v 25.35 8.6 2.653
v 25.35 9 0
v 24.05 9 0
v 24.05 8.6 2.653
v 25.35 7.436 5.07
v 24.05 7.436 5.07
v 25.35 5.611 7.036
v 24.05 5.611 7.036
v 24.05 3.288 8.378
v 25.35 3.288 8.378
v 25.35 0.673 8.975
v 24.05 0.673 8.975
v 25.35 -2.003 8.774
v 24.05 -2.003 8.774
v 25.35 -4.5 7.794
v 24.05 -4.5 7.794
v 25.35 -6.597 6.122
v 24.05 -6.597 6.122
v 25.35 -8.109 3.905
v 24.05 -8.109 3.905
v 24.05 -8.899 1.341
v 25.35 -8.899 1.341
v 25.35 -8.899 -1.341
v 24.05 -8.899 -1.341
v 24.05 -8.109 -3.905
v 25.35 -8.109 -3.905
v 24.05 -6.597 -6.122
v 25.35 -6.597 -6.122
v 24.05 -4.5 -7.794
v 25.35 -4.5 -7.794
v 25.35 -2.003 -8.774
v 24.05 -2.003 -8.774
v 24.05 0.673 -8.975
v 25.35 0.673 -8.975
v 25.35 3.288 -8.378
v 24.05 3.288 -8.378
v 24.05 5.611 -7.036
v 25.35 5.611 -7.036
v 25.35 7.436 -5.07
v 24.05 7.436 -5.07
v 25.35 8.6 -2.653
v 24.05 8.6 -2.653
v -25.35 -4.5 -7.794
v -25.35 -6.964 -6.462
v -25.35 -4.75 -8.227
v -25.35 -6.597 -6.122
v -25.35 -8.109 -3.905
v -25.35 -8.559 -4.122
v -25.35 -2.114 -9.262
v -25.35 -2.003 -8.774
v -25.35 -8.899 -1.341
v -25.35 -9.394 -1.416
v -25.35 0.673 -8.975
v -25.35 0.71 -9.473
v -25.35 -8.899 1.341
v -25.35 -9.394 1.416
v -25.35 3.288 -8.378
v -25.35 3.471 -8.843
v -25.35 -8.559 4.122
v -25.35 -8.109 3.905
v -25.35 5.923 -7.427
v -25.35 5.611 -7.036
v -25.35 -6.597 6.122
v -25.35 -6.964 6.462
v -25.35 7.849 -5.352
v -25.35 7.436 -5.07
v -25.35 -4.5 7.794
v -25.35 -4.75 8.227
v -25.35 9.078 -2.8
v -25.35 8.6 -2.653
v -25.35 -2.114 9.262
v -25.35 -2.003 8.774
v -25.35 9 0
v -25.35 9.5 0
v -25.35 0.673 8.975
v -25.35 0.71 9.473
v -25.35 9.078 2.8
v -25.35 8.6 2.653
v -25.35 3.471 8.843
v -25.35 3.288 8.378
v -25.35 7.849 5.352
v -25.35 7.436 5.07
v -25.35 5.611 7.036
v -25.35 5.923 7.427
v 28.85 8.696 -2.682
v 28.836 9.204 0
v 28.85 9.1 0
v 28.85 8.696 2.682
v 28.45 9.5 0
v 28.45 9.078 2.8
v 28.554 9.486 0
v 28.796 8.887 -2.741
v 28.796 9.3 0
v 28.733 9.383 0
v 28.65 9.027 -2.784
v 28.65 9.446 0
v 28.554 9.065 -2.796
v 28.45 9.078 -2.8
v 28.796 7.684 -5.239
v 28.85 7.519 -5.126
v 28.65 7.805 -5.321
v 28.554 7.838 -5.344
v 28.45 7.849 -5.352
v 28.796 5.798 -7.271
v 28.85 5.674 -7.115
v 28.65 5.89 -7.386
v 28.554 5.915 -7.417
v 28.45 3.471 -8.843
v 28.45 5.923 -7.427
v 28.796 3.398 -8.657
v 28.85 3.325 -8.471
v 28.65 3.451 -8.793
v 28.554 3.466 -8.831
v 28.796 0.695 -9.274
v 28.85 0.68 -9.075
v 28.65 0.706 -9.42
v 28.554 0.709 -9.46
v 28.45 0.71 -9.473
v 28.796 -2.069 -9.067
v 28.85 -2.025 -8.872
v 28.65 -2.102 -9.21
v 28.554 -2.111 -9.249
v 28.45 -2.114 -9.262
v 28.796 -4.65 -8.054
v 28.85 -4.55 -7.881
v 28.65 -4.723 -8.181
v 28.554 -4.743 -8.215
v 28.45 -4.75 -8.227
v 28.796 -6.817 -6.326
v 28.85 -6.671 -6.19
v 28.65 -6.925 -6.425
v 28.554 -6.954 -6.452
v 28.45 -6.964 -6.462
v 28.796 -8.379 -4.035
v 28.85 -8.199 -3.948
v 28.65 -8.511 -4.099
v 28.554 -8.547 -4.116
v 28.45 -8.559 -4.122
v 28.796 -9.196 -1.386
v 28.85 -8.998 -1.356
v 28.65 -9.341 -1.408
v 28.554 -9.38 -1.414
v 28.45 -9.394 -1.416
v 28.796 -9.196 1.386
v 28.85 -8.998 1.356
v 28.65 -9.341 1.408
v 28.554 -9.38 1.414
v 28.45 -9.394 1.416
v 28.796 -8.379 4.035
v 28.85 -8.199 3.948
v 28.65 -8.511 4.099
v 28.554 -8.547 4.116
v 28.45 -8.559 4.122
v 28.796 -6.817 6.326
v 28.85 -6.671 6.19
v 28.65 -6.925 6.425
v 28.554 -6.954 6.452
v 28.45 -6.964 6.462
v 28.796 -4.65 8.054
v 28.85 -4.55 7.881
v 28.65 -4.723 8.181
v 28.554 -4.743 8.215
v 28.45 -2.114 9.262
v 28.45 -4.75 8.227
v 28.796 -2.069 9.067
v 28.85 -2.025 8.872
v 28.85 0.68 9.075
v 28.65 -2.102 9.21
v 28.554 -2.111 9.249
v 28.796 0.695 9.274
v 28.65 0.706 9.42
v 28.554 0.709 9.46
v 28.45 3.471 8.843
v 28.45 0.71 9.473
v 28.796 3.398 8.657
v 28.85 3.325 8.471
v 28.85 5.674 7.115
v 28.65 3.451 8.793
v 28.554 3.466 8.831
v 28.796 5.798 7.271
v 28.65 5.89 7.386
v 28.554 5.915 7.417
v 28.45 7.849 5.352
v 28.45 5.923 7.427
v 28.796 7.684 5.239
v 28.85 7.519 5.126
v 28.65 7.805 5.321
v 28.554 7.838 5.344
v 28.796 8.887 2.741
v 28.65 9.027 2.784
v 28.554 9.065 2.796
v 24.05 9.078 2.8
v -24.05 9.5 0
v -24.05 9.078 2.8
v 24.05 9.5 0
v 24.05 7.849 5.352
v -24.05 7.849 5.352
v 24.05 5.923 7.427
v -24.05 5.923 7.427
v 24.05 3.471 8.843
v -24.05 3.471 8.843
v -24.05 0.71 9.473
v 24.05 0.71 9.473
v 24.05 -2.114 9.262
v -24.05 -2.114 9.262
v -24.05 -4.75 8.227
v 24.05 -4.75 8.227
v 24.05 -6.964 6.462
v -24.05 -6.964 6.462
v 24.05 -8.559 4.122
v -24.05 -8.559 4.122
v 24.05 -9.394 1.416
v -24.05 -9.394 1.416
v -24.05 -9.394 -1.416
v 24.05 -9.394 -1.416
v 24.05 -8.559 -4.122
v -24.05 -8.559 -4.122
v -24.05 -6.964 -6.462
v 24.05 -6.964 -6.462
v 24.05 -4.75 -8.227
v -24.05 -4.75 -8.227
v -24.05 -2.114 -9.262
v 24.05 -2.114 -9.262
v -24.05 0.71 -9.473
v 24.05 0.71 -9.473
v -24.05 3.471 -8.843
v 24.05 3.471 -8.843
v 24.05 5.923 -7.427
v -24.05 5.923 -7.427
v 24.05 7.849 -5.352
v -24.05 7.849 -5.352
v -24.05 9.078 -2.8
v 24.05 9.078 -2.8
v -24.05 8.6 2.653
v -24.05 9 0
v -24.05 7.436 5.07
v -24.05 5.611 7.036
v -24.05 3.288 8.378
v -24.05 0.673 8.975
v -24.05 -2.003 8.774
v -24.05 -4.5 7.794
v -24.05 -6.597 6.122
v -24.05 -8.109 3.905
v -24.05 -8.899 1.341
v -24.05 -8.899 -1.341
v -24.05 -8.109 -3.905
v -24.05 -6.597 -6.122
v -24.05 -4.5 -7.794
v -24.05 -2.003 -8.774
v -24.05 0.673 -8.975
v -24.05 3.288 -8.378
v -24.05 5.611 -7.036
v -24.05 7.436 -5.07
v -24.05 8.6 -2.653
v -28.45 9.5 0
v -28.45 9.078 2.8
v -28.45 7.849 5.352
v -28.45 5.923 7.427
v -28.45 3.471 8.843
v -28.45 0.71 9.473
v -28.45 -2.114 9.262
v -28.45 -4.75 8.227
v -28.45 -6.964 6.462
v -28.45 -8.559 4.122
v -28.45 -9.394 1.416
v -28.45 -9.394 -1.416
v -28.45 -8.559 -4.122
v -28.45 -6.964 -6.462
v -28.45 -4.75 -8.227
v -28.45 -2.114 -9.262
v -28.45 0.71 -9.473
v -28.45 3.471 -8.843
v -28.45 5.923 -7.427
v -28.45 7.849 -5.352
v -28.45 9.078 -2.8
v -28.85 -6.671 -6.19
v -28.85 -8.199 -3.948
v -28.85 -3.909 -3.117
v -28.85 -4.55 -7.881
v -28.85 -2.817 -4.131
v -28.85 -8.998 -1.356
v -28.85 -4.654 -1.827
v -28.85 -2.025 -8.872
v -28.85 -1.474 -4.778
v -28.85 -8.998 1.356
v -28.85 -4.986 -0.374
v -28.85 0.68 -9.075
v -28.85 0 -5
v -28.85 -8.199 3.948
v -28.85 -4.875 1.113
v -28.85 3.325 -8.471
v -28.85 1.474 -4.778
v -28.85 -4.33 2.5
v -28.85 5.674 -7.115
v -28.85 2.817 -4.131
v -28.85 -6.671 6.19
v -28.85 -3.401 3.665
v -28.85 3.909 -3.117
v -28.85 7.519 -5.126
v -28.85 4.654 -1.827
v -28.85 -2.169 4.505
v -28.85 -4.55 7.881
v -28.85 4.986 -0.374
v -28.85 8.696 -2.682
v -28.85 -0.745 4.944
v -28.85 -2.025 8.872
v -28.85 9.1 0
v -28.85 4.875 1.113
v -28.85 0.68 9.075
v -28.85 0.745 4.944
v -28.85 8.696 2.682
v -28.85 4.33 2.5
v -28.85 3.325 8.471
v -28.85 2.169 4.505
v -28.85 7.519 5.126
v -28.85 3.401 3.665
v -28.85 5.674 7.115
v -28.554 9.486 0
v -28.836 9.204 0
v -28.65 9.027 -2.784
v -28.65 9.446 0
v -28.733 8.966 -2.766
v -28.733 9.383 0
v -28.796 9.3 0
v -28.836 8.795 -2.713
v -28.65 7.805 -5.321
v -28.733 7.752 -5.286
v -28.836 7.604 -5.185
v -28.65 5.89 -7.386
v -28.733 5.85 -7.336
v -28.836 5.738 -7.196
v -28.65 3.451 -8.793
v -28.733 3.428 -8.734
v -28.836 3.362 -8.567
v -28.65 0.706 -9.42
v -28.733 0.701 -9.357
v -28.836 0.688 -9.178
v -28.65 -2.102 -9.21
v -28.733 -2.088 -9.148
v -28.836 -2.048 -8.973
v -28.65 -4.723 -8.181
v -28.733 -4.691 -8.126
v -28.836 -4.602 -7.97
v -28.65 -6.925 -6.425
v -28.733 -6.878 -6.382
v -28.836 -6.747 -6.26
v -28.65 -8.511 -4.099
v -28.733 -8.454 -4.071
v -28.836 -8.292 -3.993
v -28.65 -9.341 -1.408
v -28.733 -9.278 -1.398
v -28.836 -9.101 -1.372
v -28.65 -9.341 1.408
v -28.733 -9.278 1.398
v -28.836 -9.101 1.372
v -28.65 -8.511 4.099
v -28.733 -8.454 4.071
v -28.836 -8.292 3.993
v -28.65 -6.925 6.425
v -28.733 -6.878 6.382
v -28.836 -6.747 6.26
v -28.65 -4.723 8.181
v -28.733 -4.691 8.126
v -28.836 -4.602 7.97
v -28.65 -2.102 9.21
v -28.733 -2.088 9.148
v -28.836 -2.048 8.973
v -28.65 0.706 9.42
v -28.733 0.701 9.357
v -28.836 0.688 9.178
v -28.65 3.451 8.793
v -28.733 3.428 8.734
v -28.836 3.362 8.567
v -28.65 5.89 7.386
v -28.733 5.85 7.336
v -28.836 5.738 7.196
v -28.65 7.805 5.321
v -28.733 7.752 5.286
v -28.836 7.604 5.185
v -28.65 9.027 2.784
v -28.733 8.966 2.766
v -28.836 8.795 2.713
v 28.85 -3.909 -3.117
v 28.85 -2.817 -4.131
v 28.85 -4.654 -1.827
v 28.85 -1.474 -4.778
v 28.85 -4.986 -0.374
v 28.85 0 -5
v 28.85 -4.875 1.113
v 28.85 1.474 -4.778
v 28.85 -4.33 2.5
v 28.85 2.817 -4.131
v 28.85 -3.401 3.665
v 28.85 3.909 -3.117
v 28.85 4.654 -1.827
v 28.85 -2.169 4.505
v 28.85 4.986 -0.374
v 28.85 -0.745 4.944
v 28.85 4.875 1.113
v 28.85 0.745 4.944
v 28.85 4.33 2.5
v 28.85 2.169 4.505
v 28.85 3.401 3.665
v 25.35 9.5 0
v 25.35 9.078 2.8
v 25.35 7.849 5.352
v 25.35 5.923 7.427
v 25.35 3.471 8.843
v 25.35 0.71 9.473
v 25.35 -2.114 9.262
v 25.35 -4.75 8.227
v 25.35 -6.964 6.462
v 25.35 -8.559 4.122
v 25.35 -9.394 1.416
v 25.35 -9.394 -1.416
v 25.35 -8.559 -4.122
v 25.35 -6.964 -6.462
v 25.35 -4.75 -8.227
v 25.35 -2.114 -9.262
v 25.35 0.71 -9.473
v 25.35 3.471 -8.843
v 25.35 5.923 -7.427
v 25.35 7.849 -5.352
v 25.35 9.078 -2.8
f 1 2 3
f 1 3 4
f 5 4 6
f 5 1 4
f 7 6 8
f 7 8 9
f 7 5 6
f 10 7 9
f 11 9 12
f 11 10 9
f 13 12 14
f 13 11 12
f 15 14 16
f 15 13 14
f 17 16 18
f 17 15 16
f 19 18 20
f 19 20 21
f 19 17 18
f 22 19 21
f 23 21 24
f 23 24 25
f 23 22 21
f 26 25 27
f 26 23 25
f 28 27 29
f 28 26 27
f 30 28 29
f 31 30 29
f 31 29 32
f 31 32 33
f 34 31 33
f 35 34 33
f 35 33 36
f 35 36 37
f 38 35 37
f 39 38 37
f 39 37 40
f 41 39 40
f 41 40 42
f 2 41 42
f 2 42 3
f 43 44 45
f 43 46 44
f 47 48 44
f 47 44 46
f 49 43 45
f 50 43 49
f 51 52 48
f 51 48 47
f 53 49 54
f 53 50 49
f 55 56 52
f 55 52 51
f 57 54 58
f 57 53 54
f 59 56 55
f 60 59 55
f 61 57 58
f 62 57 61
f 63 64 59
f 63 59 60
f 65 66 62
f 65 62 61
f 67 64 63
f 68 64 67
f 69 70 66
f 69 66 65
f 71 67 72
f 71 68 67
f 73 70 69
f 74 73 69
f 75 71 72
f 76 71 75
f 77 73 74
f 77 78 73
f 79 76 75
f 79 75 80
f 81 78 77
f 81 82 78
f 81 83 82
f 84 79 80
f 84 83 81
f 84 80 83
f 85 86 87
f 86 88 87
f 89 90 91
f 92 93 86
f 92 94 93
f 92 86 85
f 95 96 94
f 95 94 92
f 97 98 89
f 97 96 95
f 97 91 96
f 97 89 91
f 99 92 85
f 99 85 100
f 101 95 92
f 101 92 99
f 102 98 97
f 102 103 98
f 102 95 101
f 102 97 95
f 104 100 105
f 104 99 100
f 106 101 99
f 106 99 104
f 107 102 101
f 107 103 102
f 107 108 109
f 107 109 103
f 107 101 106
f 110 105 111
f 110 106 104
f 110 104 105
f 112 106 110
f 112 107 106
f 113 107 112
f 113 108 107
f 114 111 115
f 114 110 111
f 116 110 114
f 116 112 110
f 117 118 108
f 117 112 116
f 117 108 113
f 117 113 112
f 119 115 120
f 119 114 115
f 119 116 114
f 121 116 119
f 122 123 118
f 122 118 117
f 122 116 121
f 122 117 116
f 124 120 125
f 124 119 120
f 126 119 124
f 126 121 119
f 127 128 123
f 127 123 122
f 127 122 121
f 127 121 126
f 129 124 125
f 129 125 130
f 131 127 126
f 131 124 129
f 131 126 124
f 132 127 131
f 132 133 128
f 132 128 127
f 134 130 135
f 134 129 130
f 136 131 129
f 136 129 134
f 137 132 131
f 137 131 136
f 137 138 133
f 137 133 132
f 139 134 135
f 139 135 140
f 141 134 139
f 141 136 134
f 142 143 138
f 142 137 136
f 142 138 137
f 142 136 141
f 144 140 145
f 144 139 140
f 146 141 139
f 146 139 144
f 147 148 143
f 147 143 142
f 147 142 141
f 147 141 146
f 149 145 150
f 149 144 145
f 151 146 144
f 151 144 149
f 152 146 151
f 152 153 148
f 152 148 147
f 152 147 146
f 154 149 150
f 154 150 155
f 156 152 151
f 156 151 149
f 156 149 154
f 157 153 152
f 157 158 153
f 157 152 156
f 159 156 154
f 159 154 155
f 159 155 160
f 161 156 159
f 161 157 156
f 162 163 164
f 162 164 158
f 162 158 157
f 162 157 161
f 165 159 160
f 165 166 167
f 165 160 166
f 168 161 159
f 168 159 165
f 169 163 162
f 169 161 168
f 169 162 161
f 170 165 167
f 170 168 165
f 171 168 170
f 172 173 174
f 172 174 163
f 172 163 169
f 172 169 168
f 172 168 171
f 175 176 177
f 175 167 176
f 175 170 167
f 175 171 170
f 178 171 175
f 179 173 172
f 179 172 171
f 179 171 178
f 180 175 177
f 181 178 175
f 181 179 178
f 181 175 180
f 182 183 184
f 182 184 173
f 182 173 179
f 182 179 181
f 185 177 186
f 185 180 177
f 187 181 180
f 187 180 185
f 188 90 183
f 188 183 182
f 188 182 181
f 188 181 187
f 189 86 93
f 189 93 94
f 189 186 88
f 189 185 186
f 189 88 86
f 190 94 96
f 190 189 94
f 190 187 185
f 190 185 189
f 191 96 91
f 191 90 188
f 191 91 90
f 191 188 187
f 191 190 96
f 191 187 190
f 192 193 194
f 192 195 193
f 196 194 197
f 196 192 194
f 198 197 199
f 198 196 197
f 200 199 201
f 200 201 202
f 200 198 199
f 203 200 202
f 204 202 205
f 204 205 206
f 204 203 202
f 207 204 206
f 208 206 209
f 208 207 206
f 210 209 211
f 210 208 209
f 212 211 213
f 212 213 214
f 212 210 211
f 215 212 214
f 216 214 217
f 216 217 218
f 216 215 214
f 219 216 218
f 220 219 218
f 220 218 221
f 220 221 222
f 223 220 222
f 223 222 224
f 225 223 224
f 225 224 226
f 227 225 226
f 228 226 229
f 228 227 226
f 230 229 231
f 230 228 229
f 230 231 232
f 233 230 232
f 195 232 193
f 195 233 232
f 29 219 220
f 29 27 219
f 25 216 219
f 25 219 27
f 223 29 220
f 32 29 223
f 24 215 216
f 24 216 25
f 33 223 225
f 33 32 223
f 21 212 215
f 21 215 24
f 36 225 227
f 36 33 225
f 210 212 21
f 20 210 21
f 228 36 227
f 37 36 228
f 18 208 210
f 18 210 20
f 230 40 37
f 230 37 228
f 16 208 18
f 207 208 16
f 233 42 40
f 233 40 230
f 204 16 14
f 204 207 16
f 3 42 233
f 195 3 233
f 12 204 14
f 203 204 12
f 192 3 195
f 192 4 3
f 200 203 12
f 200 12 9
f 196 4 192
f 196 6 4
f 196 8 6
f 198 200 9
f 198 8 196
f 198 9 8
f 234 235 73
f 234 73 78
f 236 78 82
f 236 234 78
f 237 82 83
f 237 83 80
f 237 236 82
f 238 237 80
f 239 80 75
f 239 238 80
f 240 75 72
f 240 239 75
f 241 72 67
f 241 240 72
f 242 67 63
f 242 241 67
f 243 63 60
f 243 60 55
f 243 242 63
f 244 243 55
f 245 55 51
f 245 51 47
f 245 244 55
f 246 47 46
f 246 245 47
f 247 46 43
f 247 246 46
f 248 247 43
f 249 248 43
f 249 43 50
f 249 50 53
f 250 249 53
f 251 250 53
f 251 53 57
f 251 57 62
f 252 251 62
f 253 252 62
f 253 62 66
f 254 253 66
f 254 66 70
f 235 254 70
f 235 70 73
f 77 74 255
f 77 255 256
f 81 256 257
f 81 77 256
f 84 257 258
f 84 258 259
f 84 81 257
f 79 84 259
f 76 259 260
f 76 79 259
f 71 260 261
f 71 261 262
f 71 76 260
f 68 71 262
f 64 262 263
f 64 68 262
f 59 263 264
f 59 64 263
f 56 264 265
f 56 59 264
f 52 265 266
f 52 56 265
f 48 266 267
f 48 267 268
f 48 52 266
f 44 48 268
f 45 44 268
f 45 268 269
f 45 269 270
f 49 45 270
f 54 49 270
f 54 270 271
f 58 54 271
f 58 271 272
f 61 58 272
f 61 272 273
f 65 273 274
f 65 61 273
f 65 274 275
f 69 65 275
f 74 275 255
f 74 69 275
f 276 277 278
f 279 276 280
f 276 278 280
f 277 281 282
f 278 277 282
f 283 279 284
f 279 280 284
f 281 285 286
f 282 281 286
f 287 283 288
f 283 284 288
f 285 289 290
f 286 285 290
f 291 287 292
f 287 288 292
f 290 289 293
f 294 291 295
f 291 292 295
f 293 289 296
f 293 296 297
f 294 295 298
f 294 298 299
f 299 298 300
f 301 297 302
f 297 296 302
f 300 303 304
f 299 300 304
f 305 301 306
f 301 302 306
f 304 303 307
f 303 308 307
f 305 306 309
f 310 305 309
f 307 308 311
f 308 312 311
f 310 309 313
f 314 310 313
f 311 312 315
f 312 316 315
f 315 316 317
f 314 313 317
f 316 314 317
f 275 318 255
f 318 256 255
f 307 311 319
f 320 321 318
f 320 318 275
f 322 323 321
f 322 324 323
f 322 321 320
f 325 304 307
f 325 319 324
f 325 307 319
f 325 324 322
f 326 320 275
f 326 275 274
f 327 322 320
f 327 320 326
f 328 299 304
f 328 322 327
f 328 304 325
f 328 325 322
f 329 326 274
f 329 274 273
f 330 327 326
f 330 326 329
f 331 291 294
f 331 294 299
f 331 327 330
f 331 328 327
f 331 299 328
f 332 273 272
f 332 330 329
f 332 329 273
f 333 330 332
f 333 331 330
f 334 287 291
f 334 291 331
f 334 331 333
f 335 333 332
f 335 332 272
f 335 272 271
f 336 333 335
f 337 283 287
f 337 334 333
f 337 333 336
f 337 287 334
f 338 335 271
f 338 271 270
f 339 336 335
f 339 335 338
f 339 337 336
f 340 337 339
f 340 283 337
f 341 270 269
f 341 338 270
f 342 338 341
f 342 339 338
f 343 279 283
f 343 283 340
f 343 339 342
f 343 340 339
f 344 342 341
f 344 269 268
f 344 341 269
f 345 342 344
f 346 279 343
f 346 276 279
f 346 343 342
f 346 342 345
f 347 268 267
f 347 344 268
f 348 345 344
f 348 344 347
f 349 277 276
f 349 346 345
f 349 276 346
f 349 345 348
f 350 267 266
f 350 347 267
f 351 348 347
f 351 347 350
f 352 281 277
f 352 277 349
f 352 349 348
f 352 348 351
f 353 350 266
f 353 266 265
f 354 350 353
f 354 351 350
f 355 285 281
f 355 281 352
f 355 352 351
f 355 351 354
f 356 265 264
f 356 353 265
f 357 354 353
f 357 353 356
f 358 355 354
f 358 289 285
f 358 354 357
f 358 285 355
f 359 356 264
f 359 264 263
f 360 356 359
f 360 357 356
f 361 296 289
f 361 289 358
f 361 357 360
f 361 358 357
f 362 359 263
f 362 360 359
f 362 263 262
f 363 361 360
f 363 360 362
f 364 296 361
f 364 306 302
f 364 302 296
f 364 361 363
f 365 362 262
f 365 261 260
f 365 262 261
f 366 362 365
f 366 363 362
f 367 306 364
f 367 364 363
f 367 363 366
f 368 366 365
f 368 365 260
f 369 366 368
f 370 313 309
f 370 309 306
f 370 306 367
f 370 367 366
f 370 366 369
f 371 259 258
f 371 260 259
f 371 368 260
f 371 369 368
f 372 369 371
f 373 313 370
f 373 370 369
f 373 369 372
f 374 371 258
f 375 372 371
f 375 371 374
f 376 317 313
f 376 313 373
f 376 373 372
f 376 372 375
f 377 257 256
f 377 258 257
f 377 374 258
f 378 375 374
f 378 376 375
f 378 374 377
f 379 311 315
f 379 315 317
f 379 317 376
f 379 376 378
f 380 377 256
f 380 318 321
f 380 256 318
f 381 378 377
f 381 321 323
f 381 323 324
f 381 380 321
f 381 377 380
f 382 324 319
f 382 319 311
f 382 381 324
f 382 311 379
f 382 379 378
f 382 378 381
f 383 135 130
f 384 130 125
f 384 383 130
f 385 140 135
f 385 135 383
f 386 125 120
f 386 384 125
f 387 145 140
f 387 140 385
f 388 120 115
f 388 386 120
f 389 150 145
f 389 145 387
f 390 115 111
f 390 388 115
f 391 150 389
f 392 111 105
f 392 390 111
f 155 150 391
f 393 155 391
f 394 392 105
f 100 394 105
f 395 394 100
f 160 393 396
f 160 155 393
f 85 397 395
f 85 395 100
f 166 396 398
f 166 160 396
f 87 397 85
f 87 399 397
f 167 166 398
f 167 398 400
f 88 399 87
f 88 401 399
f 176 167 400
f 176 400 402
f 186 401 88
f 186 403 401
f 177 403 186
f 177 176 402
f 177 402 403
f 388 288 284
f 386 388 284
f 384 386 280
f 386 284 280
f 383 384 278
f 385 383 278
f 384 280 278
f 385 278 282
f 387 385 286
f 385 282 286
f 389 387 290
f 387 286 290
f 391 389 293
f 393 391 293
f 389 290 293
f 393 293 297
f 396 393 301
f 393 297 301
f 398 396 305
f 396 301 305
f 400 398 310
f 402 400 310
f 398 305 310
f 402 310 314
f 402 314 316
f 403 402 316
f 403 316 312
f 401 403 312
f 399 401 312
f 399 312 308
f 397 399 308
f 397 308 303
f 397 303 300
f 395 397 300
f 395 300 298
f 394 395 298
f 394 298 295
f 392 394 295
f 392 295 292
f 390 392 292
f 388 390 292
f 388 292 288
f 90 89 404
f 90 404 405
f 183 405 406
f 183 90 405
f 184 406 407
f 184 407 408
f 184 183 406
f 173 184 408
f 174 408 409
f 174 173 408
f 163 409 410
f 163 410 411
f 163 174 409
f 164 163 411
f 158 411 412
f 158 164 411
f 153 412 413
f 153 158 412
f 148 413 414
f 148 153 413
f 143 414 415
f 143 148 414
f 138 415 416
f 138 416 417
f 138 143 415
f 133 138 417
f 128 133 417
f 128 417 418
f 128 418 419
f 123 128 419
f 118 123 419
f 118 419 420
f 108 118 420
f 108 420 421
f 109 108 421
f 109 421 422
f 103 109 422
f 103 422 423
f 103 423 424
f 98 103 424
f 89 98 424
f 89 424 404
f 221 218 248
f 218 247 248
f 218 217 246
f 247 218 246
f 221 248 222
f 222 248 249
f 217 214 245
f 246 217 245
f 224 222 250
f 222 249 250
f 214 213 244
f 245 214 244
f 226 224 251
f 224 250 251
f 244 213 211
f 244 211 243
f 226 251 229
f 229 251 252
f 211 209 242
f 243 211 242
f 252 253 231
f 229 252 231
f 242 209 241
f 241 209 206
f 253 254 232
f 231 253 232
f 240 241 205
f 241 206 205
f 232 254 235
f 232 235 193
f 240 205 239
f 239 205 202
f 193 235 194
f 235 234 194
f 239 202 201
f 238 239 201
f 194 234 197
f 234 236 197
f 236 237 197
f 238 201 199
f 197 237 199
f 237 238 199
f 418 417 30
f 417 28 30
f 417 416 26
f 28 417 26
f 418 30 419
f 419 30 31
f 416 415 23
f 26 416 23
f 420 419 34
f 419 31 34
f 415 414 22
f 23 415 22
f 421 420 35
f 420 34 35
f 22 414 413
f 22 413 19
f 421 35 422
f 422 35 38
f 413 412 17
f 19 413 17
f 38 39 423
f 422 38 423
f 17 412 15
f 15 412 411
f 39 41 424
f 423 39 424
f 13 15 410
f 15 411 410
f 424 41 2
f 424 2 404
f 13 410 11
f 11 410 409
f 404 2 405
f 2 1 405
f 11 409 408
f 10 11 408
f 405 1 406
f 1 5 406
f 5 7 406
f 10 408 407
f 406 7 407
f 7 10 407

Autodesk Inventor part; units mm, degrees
sketch "Sketch_1" plane through (0, 0, 0) normal (0, 0, 1) x (1, 0, 0)
  line L0 (28.85, 0) -> (-28.85, 0)
  line L1 (-28.85, 0) -> (-28.85, 9.1)
  arc A0 (-28.45, 9.5) -> (-28.85, 9.1) centre (-28.45, 9.1) ccw
  line L2 (-28.45, 9.5) -> (-25.35, 9.5)
  line L3 (-25.35, 9.5) -> (-25.35, 9)
  line L4 (-25.35, 9) -> (-24.05, 9)
  line L5 (-24.05, 9) -> (-24.05, 9.5)
  line L6 (-24.05, 9.5) -> (24.05, 9.5)
  line L7 (24.05, 9.5) -> (24.05, 9)
  line L8 (24.05, 9) -> (25.35, 9)
  line L9 (25.35, 9) -> (25.35, 9.5)
  line L10 (25.35, 9.5) -> (28.45, 9.5)
  arc A1 (28.85, 9.1) -> (28.45, 9.5) centre (28.45, 9.1) ccw
  line L11 (28.85, 9.1) -> (28.85, 0)
  line L12 (28.85, 0) -> (-28.85, 0)
revolve "Revolution1" add sketch "Sketch_1" angle 360 about axis through (28.85, 0, 0) along (1, 0, 0)
sketch "Sketch2" plane through (28.85, 0, 0) normal (1, 0, 0) x (0, 0, -1)
  point P0 (0, 0)
hole "Hole1" at (28.85, 0, 0) direction (-1, 0, 0) diameter 10 depth 57.7
ref_plane "to_housing_XY" through (0, 0, 0) normal (-1, 0, 0) x (0, 0, -1)
ref_plane "to_housing_YZ" through (0, 0, 0) normal (0, 0, -1) x (0, -1, 0)
ref_plane "to_housing_ZX" through (0, 0, 0) normal (0, -1, 0) x (-1, 0, 0)
properties part number "BUSHING_REFERENCE_DATA_FOR_LHSSW10"
